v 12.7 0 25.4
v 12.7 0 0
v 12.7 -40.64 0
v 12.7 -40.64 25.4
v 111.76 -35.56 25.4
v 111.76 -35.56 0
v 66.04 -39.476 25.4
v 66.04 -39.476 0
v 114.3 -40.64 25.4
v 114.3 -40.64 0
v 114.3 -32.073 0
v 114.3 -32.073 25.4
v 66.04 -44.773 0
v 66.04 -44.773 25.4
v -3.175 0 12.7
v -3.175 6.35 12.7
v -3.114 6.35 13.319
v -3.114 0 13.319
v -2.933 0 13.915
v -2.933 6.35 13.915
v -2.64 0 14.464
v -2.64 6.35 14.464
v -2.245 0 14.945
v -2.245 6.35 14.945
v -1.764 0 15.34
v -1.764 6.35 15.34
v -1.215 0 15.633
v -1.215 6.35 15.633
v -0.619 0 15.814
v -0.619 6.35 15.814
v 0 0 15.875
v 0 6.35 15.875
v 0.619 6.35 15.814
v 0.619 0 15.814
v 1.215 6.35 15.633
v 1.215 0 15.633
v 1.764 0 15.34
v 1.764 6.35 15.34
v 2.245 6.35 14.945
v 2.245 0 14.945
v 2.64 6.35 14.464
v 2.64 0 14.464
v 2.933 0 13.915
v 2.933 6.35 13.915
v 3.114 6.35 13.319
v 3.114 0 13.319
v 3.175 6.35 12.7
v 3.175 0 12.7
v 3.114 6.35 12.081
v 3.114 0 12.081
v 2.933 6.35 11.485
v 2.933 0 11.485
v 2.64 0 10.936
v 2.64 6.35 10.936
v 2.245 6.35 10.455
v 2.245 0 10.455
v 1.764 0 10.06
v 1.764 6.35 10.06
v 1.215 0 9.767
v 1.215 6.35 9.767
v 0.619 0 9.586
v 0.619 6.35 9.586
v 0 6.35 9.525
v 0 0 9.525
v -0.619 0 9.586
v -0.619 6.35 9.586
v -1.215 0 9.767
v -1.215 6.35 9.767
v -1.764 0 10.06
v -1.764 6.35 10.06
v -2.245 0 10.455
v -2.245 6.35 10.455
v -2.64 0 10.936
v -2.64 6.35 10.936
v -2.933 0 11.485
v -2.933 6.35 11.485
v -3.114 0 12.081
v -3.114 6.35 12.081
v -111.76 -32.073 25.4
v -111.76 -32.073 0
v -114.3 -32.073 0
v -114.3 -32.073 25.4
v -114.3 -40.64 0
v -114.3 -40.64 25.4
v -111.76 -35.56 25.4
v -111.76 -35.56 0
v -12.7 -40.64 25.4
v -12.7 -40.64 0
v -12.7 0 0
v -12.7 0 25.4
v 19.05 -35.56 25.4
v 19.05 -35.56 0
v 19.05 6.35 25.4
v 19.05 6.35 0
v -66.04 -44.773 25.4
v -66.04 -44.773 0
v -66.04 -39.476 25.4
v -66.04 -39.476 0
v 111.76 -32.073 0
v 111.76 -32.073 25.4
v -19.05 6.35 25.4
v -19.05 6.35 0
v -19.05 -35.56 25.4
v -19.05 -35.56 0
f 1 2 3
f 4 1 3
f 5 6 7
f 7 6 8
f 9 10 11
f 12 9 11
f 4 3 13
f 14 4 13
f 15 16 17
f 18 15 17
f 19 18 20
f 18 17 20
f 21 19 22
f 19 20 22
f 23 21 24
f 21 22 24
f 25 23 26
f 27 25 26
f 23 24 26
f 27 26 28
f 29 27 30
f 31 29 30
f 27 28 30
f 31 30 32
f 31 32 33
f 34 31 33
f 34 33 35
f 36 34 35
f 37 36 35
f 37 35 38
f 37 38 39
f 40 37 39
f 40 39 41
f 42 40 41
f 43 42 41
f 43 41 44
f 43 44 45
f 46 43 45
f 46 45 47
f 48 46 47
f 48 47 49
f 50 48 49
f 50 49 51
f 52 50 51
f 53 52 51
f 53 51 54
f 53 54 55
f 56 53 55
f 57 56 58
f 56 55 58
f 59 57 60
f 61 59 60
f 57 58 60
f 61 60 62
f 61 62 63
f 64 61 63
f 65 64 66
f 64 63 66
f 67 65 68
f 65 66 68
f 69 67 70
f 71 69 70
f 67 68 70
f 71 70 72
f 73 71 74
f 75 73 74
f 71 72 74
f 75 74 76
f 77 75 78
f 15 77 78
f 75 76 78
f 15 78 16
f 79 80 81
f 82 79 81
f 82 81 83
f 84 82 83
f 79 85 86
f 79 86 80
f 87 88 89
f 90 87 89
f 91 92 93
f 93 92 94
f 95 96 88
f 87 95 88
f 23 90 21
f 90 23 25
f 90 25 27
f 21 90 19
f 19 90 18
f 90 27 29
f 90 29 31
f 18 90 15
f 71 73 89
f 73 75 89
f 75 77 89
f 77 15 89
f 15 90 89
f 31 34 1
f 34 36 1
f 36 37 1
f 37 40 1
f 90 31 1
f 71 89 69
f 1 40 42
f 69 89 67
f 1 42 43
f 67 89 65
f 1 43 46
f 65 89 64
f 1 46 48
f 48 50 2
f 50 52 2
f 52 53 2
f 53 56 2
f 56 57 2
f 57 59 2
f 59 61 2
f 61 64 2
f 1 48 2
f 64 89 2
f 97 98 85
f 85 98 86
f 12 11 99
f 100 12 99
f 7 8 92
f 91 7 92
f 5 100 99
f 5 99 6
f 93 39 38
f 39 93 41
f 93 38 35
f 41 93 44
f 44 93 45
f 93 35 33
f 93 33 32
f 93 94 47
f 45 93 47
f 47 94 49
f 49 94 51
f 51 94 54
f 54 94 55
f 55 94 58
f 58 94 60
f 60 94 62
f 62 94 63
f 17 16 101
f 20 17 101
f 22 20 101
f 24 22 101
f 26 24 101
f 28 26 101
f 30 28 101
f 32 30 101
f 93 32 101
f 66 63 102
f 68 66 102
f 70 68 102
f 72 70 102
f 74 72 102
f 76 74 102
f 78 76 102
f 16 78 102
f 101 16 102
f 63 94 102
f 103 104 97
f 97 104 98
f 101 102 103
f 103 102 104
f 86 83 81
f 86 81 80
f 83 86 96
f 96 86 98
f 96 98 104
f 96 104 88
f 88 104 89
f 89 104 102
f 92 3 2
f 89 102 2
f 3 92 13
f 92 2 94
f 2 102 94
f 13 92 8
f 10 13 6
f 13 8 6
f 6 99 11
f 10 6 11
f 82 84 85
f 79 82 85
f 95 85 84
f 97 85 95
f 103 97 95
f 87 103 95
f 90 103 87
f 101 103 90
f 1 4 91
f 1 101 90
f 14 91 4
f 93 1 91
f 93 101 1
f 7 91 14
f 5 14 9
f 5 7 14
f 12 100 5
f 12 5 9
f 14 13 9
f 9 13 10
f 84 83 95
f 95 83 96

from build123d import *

# Parameters (mm, degrees)
BOSS_EXTRUDE1_DEPTH = 25.4
CUT_EXTRUDE1_REACH  = 129.762
SKETCH3_R           = 3.175


with BuildPart() as part:
    # Sketch2 → Boss-Extrude1 (new body)
    with BuildSketch(Plane.XY):
        Polygon((0, 0), (12.7, 0), (12.7, -40.64), (66.04, -44.773379719), (114.3, -40.64), (114.3, -32.073379719), (111.76, -32.073379719), (111.76, -35.56), (66.04, -39.475833418), (19.05, -35.56), (19.05, 0), (19.05, 6.35), (0, 6.35), align=None)
        Polygon((-12.7, 0), (0, 0), (0, 6.35), (-19.05, 6.35), (-19.05, 0), (-19.05, -35.56), (-66.04, -39.475833418), (-111.76, -35.56), (-111.76, -32.073379719), (-114.3, -32.073379719), (-114.3, -40.64), (-66.04, -44.773379719), (-12.7, -40.64), align=None)
    extrude(amount=BOSS_EXTRUDE1_DEPTH)

    # Sketch3 → Cut-Extrude1 (cut, up to next)
    with BuildSketch(Plane(origin=(0, 6.35, 0), x_dir=(1, 0, 0), z_dir=(0, 1, 0)), mode=Mode.PRIVATE) as cut_extrude1_sk1:
        with Locations(Location((0, -12.7, 0), (0, 0, 180))):
            Circle(SKETCH3_R)
    cut_extrude1_tool1 = extrude(cut_extrude1_sk1.sketch, amount=-CUT_EXTRUDE1_REACH, mode=Mode.PRIVATE) & part.part
    add(cut_extrude1_tool1.solids().sort_by_distance((0, 6.35, 12.7))[0], mode=Mode.SUBTRACT)


solid = part.part
